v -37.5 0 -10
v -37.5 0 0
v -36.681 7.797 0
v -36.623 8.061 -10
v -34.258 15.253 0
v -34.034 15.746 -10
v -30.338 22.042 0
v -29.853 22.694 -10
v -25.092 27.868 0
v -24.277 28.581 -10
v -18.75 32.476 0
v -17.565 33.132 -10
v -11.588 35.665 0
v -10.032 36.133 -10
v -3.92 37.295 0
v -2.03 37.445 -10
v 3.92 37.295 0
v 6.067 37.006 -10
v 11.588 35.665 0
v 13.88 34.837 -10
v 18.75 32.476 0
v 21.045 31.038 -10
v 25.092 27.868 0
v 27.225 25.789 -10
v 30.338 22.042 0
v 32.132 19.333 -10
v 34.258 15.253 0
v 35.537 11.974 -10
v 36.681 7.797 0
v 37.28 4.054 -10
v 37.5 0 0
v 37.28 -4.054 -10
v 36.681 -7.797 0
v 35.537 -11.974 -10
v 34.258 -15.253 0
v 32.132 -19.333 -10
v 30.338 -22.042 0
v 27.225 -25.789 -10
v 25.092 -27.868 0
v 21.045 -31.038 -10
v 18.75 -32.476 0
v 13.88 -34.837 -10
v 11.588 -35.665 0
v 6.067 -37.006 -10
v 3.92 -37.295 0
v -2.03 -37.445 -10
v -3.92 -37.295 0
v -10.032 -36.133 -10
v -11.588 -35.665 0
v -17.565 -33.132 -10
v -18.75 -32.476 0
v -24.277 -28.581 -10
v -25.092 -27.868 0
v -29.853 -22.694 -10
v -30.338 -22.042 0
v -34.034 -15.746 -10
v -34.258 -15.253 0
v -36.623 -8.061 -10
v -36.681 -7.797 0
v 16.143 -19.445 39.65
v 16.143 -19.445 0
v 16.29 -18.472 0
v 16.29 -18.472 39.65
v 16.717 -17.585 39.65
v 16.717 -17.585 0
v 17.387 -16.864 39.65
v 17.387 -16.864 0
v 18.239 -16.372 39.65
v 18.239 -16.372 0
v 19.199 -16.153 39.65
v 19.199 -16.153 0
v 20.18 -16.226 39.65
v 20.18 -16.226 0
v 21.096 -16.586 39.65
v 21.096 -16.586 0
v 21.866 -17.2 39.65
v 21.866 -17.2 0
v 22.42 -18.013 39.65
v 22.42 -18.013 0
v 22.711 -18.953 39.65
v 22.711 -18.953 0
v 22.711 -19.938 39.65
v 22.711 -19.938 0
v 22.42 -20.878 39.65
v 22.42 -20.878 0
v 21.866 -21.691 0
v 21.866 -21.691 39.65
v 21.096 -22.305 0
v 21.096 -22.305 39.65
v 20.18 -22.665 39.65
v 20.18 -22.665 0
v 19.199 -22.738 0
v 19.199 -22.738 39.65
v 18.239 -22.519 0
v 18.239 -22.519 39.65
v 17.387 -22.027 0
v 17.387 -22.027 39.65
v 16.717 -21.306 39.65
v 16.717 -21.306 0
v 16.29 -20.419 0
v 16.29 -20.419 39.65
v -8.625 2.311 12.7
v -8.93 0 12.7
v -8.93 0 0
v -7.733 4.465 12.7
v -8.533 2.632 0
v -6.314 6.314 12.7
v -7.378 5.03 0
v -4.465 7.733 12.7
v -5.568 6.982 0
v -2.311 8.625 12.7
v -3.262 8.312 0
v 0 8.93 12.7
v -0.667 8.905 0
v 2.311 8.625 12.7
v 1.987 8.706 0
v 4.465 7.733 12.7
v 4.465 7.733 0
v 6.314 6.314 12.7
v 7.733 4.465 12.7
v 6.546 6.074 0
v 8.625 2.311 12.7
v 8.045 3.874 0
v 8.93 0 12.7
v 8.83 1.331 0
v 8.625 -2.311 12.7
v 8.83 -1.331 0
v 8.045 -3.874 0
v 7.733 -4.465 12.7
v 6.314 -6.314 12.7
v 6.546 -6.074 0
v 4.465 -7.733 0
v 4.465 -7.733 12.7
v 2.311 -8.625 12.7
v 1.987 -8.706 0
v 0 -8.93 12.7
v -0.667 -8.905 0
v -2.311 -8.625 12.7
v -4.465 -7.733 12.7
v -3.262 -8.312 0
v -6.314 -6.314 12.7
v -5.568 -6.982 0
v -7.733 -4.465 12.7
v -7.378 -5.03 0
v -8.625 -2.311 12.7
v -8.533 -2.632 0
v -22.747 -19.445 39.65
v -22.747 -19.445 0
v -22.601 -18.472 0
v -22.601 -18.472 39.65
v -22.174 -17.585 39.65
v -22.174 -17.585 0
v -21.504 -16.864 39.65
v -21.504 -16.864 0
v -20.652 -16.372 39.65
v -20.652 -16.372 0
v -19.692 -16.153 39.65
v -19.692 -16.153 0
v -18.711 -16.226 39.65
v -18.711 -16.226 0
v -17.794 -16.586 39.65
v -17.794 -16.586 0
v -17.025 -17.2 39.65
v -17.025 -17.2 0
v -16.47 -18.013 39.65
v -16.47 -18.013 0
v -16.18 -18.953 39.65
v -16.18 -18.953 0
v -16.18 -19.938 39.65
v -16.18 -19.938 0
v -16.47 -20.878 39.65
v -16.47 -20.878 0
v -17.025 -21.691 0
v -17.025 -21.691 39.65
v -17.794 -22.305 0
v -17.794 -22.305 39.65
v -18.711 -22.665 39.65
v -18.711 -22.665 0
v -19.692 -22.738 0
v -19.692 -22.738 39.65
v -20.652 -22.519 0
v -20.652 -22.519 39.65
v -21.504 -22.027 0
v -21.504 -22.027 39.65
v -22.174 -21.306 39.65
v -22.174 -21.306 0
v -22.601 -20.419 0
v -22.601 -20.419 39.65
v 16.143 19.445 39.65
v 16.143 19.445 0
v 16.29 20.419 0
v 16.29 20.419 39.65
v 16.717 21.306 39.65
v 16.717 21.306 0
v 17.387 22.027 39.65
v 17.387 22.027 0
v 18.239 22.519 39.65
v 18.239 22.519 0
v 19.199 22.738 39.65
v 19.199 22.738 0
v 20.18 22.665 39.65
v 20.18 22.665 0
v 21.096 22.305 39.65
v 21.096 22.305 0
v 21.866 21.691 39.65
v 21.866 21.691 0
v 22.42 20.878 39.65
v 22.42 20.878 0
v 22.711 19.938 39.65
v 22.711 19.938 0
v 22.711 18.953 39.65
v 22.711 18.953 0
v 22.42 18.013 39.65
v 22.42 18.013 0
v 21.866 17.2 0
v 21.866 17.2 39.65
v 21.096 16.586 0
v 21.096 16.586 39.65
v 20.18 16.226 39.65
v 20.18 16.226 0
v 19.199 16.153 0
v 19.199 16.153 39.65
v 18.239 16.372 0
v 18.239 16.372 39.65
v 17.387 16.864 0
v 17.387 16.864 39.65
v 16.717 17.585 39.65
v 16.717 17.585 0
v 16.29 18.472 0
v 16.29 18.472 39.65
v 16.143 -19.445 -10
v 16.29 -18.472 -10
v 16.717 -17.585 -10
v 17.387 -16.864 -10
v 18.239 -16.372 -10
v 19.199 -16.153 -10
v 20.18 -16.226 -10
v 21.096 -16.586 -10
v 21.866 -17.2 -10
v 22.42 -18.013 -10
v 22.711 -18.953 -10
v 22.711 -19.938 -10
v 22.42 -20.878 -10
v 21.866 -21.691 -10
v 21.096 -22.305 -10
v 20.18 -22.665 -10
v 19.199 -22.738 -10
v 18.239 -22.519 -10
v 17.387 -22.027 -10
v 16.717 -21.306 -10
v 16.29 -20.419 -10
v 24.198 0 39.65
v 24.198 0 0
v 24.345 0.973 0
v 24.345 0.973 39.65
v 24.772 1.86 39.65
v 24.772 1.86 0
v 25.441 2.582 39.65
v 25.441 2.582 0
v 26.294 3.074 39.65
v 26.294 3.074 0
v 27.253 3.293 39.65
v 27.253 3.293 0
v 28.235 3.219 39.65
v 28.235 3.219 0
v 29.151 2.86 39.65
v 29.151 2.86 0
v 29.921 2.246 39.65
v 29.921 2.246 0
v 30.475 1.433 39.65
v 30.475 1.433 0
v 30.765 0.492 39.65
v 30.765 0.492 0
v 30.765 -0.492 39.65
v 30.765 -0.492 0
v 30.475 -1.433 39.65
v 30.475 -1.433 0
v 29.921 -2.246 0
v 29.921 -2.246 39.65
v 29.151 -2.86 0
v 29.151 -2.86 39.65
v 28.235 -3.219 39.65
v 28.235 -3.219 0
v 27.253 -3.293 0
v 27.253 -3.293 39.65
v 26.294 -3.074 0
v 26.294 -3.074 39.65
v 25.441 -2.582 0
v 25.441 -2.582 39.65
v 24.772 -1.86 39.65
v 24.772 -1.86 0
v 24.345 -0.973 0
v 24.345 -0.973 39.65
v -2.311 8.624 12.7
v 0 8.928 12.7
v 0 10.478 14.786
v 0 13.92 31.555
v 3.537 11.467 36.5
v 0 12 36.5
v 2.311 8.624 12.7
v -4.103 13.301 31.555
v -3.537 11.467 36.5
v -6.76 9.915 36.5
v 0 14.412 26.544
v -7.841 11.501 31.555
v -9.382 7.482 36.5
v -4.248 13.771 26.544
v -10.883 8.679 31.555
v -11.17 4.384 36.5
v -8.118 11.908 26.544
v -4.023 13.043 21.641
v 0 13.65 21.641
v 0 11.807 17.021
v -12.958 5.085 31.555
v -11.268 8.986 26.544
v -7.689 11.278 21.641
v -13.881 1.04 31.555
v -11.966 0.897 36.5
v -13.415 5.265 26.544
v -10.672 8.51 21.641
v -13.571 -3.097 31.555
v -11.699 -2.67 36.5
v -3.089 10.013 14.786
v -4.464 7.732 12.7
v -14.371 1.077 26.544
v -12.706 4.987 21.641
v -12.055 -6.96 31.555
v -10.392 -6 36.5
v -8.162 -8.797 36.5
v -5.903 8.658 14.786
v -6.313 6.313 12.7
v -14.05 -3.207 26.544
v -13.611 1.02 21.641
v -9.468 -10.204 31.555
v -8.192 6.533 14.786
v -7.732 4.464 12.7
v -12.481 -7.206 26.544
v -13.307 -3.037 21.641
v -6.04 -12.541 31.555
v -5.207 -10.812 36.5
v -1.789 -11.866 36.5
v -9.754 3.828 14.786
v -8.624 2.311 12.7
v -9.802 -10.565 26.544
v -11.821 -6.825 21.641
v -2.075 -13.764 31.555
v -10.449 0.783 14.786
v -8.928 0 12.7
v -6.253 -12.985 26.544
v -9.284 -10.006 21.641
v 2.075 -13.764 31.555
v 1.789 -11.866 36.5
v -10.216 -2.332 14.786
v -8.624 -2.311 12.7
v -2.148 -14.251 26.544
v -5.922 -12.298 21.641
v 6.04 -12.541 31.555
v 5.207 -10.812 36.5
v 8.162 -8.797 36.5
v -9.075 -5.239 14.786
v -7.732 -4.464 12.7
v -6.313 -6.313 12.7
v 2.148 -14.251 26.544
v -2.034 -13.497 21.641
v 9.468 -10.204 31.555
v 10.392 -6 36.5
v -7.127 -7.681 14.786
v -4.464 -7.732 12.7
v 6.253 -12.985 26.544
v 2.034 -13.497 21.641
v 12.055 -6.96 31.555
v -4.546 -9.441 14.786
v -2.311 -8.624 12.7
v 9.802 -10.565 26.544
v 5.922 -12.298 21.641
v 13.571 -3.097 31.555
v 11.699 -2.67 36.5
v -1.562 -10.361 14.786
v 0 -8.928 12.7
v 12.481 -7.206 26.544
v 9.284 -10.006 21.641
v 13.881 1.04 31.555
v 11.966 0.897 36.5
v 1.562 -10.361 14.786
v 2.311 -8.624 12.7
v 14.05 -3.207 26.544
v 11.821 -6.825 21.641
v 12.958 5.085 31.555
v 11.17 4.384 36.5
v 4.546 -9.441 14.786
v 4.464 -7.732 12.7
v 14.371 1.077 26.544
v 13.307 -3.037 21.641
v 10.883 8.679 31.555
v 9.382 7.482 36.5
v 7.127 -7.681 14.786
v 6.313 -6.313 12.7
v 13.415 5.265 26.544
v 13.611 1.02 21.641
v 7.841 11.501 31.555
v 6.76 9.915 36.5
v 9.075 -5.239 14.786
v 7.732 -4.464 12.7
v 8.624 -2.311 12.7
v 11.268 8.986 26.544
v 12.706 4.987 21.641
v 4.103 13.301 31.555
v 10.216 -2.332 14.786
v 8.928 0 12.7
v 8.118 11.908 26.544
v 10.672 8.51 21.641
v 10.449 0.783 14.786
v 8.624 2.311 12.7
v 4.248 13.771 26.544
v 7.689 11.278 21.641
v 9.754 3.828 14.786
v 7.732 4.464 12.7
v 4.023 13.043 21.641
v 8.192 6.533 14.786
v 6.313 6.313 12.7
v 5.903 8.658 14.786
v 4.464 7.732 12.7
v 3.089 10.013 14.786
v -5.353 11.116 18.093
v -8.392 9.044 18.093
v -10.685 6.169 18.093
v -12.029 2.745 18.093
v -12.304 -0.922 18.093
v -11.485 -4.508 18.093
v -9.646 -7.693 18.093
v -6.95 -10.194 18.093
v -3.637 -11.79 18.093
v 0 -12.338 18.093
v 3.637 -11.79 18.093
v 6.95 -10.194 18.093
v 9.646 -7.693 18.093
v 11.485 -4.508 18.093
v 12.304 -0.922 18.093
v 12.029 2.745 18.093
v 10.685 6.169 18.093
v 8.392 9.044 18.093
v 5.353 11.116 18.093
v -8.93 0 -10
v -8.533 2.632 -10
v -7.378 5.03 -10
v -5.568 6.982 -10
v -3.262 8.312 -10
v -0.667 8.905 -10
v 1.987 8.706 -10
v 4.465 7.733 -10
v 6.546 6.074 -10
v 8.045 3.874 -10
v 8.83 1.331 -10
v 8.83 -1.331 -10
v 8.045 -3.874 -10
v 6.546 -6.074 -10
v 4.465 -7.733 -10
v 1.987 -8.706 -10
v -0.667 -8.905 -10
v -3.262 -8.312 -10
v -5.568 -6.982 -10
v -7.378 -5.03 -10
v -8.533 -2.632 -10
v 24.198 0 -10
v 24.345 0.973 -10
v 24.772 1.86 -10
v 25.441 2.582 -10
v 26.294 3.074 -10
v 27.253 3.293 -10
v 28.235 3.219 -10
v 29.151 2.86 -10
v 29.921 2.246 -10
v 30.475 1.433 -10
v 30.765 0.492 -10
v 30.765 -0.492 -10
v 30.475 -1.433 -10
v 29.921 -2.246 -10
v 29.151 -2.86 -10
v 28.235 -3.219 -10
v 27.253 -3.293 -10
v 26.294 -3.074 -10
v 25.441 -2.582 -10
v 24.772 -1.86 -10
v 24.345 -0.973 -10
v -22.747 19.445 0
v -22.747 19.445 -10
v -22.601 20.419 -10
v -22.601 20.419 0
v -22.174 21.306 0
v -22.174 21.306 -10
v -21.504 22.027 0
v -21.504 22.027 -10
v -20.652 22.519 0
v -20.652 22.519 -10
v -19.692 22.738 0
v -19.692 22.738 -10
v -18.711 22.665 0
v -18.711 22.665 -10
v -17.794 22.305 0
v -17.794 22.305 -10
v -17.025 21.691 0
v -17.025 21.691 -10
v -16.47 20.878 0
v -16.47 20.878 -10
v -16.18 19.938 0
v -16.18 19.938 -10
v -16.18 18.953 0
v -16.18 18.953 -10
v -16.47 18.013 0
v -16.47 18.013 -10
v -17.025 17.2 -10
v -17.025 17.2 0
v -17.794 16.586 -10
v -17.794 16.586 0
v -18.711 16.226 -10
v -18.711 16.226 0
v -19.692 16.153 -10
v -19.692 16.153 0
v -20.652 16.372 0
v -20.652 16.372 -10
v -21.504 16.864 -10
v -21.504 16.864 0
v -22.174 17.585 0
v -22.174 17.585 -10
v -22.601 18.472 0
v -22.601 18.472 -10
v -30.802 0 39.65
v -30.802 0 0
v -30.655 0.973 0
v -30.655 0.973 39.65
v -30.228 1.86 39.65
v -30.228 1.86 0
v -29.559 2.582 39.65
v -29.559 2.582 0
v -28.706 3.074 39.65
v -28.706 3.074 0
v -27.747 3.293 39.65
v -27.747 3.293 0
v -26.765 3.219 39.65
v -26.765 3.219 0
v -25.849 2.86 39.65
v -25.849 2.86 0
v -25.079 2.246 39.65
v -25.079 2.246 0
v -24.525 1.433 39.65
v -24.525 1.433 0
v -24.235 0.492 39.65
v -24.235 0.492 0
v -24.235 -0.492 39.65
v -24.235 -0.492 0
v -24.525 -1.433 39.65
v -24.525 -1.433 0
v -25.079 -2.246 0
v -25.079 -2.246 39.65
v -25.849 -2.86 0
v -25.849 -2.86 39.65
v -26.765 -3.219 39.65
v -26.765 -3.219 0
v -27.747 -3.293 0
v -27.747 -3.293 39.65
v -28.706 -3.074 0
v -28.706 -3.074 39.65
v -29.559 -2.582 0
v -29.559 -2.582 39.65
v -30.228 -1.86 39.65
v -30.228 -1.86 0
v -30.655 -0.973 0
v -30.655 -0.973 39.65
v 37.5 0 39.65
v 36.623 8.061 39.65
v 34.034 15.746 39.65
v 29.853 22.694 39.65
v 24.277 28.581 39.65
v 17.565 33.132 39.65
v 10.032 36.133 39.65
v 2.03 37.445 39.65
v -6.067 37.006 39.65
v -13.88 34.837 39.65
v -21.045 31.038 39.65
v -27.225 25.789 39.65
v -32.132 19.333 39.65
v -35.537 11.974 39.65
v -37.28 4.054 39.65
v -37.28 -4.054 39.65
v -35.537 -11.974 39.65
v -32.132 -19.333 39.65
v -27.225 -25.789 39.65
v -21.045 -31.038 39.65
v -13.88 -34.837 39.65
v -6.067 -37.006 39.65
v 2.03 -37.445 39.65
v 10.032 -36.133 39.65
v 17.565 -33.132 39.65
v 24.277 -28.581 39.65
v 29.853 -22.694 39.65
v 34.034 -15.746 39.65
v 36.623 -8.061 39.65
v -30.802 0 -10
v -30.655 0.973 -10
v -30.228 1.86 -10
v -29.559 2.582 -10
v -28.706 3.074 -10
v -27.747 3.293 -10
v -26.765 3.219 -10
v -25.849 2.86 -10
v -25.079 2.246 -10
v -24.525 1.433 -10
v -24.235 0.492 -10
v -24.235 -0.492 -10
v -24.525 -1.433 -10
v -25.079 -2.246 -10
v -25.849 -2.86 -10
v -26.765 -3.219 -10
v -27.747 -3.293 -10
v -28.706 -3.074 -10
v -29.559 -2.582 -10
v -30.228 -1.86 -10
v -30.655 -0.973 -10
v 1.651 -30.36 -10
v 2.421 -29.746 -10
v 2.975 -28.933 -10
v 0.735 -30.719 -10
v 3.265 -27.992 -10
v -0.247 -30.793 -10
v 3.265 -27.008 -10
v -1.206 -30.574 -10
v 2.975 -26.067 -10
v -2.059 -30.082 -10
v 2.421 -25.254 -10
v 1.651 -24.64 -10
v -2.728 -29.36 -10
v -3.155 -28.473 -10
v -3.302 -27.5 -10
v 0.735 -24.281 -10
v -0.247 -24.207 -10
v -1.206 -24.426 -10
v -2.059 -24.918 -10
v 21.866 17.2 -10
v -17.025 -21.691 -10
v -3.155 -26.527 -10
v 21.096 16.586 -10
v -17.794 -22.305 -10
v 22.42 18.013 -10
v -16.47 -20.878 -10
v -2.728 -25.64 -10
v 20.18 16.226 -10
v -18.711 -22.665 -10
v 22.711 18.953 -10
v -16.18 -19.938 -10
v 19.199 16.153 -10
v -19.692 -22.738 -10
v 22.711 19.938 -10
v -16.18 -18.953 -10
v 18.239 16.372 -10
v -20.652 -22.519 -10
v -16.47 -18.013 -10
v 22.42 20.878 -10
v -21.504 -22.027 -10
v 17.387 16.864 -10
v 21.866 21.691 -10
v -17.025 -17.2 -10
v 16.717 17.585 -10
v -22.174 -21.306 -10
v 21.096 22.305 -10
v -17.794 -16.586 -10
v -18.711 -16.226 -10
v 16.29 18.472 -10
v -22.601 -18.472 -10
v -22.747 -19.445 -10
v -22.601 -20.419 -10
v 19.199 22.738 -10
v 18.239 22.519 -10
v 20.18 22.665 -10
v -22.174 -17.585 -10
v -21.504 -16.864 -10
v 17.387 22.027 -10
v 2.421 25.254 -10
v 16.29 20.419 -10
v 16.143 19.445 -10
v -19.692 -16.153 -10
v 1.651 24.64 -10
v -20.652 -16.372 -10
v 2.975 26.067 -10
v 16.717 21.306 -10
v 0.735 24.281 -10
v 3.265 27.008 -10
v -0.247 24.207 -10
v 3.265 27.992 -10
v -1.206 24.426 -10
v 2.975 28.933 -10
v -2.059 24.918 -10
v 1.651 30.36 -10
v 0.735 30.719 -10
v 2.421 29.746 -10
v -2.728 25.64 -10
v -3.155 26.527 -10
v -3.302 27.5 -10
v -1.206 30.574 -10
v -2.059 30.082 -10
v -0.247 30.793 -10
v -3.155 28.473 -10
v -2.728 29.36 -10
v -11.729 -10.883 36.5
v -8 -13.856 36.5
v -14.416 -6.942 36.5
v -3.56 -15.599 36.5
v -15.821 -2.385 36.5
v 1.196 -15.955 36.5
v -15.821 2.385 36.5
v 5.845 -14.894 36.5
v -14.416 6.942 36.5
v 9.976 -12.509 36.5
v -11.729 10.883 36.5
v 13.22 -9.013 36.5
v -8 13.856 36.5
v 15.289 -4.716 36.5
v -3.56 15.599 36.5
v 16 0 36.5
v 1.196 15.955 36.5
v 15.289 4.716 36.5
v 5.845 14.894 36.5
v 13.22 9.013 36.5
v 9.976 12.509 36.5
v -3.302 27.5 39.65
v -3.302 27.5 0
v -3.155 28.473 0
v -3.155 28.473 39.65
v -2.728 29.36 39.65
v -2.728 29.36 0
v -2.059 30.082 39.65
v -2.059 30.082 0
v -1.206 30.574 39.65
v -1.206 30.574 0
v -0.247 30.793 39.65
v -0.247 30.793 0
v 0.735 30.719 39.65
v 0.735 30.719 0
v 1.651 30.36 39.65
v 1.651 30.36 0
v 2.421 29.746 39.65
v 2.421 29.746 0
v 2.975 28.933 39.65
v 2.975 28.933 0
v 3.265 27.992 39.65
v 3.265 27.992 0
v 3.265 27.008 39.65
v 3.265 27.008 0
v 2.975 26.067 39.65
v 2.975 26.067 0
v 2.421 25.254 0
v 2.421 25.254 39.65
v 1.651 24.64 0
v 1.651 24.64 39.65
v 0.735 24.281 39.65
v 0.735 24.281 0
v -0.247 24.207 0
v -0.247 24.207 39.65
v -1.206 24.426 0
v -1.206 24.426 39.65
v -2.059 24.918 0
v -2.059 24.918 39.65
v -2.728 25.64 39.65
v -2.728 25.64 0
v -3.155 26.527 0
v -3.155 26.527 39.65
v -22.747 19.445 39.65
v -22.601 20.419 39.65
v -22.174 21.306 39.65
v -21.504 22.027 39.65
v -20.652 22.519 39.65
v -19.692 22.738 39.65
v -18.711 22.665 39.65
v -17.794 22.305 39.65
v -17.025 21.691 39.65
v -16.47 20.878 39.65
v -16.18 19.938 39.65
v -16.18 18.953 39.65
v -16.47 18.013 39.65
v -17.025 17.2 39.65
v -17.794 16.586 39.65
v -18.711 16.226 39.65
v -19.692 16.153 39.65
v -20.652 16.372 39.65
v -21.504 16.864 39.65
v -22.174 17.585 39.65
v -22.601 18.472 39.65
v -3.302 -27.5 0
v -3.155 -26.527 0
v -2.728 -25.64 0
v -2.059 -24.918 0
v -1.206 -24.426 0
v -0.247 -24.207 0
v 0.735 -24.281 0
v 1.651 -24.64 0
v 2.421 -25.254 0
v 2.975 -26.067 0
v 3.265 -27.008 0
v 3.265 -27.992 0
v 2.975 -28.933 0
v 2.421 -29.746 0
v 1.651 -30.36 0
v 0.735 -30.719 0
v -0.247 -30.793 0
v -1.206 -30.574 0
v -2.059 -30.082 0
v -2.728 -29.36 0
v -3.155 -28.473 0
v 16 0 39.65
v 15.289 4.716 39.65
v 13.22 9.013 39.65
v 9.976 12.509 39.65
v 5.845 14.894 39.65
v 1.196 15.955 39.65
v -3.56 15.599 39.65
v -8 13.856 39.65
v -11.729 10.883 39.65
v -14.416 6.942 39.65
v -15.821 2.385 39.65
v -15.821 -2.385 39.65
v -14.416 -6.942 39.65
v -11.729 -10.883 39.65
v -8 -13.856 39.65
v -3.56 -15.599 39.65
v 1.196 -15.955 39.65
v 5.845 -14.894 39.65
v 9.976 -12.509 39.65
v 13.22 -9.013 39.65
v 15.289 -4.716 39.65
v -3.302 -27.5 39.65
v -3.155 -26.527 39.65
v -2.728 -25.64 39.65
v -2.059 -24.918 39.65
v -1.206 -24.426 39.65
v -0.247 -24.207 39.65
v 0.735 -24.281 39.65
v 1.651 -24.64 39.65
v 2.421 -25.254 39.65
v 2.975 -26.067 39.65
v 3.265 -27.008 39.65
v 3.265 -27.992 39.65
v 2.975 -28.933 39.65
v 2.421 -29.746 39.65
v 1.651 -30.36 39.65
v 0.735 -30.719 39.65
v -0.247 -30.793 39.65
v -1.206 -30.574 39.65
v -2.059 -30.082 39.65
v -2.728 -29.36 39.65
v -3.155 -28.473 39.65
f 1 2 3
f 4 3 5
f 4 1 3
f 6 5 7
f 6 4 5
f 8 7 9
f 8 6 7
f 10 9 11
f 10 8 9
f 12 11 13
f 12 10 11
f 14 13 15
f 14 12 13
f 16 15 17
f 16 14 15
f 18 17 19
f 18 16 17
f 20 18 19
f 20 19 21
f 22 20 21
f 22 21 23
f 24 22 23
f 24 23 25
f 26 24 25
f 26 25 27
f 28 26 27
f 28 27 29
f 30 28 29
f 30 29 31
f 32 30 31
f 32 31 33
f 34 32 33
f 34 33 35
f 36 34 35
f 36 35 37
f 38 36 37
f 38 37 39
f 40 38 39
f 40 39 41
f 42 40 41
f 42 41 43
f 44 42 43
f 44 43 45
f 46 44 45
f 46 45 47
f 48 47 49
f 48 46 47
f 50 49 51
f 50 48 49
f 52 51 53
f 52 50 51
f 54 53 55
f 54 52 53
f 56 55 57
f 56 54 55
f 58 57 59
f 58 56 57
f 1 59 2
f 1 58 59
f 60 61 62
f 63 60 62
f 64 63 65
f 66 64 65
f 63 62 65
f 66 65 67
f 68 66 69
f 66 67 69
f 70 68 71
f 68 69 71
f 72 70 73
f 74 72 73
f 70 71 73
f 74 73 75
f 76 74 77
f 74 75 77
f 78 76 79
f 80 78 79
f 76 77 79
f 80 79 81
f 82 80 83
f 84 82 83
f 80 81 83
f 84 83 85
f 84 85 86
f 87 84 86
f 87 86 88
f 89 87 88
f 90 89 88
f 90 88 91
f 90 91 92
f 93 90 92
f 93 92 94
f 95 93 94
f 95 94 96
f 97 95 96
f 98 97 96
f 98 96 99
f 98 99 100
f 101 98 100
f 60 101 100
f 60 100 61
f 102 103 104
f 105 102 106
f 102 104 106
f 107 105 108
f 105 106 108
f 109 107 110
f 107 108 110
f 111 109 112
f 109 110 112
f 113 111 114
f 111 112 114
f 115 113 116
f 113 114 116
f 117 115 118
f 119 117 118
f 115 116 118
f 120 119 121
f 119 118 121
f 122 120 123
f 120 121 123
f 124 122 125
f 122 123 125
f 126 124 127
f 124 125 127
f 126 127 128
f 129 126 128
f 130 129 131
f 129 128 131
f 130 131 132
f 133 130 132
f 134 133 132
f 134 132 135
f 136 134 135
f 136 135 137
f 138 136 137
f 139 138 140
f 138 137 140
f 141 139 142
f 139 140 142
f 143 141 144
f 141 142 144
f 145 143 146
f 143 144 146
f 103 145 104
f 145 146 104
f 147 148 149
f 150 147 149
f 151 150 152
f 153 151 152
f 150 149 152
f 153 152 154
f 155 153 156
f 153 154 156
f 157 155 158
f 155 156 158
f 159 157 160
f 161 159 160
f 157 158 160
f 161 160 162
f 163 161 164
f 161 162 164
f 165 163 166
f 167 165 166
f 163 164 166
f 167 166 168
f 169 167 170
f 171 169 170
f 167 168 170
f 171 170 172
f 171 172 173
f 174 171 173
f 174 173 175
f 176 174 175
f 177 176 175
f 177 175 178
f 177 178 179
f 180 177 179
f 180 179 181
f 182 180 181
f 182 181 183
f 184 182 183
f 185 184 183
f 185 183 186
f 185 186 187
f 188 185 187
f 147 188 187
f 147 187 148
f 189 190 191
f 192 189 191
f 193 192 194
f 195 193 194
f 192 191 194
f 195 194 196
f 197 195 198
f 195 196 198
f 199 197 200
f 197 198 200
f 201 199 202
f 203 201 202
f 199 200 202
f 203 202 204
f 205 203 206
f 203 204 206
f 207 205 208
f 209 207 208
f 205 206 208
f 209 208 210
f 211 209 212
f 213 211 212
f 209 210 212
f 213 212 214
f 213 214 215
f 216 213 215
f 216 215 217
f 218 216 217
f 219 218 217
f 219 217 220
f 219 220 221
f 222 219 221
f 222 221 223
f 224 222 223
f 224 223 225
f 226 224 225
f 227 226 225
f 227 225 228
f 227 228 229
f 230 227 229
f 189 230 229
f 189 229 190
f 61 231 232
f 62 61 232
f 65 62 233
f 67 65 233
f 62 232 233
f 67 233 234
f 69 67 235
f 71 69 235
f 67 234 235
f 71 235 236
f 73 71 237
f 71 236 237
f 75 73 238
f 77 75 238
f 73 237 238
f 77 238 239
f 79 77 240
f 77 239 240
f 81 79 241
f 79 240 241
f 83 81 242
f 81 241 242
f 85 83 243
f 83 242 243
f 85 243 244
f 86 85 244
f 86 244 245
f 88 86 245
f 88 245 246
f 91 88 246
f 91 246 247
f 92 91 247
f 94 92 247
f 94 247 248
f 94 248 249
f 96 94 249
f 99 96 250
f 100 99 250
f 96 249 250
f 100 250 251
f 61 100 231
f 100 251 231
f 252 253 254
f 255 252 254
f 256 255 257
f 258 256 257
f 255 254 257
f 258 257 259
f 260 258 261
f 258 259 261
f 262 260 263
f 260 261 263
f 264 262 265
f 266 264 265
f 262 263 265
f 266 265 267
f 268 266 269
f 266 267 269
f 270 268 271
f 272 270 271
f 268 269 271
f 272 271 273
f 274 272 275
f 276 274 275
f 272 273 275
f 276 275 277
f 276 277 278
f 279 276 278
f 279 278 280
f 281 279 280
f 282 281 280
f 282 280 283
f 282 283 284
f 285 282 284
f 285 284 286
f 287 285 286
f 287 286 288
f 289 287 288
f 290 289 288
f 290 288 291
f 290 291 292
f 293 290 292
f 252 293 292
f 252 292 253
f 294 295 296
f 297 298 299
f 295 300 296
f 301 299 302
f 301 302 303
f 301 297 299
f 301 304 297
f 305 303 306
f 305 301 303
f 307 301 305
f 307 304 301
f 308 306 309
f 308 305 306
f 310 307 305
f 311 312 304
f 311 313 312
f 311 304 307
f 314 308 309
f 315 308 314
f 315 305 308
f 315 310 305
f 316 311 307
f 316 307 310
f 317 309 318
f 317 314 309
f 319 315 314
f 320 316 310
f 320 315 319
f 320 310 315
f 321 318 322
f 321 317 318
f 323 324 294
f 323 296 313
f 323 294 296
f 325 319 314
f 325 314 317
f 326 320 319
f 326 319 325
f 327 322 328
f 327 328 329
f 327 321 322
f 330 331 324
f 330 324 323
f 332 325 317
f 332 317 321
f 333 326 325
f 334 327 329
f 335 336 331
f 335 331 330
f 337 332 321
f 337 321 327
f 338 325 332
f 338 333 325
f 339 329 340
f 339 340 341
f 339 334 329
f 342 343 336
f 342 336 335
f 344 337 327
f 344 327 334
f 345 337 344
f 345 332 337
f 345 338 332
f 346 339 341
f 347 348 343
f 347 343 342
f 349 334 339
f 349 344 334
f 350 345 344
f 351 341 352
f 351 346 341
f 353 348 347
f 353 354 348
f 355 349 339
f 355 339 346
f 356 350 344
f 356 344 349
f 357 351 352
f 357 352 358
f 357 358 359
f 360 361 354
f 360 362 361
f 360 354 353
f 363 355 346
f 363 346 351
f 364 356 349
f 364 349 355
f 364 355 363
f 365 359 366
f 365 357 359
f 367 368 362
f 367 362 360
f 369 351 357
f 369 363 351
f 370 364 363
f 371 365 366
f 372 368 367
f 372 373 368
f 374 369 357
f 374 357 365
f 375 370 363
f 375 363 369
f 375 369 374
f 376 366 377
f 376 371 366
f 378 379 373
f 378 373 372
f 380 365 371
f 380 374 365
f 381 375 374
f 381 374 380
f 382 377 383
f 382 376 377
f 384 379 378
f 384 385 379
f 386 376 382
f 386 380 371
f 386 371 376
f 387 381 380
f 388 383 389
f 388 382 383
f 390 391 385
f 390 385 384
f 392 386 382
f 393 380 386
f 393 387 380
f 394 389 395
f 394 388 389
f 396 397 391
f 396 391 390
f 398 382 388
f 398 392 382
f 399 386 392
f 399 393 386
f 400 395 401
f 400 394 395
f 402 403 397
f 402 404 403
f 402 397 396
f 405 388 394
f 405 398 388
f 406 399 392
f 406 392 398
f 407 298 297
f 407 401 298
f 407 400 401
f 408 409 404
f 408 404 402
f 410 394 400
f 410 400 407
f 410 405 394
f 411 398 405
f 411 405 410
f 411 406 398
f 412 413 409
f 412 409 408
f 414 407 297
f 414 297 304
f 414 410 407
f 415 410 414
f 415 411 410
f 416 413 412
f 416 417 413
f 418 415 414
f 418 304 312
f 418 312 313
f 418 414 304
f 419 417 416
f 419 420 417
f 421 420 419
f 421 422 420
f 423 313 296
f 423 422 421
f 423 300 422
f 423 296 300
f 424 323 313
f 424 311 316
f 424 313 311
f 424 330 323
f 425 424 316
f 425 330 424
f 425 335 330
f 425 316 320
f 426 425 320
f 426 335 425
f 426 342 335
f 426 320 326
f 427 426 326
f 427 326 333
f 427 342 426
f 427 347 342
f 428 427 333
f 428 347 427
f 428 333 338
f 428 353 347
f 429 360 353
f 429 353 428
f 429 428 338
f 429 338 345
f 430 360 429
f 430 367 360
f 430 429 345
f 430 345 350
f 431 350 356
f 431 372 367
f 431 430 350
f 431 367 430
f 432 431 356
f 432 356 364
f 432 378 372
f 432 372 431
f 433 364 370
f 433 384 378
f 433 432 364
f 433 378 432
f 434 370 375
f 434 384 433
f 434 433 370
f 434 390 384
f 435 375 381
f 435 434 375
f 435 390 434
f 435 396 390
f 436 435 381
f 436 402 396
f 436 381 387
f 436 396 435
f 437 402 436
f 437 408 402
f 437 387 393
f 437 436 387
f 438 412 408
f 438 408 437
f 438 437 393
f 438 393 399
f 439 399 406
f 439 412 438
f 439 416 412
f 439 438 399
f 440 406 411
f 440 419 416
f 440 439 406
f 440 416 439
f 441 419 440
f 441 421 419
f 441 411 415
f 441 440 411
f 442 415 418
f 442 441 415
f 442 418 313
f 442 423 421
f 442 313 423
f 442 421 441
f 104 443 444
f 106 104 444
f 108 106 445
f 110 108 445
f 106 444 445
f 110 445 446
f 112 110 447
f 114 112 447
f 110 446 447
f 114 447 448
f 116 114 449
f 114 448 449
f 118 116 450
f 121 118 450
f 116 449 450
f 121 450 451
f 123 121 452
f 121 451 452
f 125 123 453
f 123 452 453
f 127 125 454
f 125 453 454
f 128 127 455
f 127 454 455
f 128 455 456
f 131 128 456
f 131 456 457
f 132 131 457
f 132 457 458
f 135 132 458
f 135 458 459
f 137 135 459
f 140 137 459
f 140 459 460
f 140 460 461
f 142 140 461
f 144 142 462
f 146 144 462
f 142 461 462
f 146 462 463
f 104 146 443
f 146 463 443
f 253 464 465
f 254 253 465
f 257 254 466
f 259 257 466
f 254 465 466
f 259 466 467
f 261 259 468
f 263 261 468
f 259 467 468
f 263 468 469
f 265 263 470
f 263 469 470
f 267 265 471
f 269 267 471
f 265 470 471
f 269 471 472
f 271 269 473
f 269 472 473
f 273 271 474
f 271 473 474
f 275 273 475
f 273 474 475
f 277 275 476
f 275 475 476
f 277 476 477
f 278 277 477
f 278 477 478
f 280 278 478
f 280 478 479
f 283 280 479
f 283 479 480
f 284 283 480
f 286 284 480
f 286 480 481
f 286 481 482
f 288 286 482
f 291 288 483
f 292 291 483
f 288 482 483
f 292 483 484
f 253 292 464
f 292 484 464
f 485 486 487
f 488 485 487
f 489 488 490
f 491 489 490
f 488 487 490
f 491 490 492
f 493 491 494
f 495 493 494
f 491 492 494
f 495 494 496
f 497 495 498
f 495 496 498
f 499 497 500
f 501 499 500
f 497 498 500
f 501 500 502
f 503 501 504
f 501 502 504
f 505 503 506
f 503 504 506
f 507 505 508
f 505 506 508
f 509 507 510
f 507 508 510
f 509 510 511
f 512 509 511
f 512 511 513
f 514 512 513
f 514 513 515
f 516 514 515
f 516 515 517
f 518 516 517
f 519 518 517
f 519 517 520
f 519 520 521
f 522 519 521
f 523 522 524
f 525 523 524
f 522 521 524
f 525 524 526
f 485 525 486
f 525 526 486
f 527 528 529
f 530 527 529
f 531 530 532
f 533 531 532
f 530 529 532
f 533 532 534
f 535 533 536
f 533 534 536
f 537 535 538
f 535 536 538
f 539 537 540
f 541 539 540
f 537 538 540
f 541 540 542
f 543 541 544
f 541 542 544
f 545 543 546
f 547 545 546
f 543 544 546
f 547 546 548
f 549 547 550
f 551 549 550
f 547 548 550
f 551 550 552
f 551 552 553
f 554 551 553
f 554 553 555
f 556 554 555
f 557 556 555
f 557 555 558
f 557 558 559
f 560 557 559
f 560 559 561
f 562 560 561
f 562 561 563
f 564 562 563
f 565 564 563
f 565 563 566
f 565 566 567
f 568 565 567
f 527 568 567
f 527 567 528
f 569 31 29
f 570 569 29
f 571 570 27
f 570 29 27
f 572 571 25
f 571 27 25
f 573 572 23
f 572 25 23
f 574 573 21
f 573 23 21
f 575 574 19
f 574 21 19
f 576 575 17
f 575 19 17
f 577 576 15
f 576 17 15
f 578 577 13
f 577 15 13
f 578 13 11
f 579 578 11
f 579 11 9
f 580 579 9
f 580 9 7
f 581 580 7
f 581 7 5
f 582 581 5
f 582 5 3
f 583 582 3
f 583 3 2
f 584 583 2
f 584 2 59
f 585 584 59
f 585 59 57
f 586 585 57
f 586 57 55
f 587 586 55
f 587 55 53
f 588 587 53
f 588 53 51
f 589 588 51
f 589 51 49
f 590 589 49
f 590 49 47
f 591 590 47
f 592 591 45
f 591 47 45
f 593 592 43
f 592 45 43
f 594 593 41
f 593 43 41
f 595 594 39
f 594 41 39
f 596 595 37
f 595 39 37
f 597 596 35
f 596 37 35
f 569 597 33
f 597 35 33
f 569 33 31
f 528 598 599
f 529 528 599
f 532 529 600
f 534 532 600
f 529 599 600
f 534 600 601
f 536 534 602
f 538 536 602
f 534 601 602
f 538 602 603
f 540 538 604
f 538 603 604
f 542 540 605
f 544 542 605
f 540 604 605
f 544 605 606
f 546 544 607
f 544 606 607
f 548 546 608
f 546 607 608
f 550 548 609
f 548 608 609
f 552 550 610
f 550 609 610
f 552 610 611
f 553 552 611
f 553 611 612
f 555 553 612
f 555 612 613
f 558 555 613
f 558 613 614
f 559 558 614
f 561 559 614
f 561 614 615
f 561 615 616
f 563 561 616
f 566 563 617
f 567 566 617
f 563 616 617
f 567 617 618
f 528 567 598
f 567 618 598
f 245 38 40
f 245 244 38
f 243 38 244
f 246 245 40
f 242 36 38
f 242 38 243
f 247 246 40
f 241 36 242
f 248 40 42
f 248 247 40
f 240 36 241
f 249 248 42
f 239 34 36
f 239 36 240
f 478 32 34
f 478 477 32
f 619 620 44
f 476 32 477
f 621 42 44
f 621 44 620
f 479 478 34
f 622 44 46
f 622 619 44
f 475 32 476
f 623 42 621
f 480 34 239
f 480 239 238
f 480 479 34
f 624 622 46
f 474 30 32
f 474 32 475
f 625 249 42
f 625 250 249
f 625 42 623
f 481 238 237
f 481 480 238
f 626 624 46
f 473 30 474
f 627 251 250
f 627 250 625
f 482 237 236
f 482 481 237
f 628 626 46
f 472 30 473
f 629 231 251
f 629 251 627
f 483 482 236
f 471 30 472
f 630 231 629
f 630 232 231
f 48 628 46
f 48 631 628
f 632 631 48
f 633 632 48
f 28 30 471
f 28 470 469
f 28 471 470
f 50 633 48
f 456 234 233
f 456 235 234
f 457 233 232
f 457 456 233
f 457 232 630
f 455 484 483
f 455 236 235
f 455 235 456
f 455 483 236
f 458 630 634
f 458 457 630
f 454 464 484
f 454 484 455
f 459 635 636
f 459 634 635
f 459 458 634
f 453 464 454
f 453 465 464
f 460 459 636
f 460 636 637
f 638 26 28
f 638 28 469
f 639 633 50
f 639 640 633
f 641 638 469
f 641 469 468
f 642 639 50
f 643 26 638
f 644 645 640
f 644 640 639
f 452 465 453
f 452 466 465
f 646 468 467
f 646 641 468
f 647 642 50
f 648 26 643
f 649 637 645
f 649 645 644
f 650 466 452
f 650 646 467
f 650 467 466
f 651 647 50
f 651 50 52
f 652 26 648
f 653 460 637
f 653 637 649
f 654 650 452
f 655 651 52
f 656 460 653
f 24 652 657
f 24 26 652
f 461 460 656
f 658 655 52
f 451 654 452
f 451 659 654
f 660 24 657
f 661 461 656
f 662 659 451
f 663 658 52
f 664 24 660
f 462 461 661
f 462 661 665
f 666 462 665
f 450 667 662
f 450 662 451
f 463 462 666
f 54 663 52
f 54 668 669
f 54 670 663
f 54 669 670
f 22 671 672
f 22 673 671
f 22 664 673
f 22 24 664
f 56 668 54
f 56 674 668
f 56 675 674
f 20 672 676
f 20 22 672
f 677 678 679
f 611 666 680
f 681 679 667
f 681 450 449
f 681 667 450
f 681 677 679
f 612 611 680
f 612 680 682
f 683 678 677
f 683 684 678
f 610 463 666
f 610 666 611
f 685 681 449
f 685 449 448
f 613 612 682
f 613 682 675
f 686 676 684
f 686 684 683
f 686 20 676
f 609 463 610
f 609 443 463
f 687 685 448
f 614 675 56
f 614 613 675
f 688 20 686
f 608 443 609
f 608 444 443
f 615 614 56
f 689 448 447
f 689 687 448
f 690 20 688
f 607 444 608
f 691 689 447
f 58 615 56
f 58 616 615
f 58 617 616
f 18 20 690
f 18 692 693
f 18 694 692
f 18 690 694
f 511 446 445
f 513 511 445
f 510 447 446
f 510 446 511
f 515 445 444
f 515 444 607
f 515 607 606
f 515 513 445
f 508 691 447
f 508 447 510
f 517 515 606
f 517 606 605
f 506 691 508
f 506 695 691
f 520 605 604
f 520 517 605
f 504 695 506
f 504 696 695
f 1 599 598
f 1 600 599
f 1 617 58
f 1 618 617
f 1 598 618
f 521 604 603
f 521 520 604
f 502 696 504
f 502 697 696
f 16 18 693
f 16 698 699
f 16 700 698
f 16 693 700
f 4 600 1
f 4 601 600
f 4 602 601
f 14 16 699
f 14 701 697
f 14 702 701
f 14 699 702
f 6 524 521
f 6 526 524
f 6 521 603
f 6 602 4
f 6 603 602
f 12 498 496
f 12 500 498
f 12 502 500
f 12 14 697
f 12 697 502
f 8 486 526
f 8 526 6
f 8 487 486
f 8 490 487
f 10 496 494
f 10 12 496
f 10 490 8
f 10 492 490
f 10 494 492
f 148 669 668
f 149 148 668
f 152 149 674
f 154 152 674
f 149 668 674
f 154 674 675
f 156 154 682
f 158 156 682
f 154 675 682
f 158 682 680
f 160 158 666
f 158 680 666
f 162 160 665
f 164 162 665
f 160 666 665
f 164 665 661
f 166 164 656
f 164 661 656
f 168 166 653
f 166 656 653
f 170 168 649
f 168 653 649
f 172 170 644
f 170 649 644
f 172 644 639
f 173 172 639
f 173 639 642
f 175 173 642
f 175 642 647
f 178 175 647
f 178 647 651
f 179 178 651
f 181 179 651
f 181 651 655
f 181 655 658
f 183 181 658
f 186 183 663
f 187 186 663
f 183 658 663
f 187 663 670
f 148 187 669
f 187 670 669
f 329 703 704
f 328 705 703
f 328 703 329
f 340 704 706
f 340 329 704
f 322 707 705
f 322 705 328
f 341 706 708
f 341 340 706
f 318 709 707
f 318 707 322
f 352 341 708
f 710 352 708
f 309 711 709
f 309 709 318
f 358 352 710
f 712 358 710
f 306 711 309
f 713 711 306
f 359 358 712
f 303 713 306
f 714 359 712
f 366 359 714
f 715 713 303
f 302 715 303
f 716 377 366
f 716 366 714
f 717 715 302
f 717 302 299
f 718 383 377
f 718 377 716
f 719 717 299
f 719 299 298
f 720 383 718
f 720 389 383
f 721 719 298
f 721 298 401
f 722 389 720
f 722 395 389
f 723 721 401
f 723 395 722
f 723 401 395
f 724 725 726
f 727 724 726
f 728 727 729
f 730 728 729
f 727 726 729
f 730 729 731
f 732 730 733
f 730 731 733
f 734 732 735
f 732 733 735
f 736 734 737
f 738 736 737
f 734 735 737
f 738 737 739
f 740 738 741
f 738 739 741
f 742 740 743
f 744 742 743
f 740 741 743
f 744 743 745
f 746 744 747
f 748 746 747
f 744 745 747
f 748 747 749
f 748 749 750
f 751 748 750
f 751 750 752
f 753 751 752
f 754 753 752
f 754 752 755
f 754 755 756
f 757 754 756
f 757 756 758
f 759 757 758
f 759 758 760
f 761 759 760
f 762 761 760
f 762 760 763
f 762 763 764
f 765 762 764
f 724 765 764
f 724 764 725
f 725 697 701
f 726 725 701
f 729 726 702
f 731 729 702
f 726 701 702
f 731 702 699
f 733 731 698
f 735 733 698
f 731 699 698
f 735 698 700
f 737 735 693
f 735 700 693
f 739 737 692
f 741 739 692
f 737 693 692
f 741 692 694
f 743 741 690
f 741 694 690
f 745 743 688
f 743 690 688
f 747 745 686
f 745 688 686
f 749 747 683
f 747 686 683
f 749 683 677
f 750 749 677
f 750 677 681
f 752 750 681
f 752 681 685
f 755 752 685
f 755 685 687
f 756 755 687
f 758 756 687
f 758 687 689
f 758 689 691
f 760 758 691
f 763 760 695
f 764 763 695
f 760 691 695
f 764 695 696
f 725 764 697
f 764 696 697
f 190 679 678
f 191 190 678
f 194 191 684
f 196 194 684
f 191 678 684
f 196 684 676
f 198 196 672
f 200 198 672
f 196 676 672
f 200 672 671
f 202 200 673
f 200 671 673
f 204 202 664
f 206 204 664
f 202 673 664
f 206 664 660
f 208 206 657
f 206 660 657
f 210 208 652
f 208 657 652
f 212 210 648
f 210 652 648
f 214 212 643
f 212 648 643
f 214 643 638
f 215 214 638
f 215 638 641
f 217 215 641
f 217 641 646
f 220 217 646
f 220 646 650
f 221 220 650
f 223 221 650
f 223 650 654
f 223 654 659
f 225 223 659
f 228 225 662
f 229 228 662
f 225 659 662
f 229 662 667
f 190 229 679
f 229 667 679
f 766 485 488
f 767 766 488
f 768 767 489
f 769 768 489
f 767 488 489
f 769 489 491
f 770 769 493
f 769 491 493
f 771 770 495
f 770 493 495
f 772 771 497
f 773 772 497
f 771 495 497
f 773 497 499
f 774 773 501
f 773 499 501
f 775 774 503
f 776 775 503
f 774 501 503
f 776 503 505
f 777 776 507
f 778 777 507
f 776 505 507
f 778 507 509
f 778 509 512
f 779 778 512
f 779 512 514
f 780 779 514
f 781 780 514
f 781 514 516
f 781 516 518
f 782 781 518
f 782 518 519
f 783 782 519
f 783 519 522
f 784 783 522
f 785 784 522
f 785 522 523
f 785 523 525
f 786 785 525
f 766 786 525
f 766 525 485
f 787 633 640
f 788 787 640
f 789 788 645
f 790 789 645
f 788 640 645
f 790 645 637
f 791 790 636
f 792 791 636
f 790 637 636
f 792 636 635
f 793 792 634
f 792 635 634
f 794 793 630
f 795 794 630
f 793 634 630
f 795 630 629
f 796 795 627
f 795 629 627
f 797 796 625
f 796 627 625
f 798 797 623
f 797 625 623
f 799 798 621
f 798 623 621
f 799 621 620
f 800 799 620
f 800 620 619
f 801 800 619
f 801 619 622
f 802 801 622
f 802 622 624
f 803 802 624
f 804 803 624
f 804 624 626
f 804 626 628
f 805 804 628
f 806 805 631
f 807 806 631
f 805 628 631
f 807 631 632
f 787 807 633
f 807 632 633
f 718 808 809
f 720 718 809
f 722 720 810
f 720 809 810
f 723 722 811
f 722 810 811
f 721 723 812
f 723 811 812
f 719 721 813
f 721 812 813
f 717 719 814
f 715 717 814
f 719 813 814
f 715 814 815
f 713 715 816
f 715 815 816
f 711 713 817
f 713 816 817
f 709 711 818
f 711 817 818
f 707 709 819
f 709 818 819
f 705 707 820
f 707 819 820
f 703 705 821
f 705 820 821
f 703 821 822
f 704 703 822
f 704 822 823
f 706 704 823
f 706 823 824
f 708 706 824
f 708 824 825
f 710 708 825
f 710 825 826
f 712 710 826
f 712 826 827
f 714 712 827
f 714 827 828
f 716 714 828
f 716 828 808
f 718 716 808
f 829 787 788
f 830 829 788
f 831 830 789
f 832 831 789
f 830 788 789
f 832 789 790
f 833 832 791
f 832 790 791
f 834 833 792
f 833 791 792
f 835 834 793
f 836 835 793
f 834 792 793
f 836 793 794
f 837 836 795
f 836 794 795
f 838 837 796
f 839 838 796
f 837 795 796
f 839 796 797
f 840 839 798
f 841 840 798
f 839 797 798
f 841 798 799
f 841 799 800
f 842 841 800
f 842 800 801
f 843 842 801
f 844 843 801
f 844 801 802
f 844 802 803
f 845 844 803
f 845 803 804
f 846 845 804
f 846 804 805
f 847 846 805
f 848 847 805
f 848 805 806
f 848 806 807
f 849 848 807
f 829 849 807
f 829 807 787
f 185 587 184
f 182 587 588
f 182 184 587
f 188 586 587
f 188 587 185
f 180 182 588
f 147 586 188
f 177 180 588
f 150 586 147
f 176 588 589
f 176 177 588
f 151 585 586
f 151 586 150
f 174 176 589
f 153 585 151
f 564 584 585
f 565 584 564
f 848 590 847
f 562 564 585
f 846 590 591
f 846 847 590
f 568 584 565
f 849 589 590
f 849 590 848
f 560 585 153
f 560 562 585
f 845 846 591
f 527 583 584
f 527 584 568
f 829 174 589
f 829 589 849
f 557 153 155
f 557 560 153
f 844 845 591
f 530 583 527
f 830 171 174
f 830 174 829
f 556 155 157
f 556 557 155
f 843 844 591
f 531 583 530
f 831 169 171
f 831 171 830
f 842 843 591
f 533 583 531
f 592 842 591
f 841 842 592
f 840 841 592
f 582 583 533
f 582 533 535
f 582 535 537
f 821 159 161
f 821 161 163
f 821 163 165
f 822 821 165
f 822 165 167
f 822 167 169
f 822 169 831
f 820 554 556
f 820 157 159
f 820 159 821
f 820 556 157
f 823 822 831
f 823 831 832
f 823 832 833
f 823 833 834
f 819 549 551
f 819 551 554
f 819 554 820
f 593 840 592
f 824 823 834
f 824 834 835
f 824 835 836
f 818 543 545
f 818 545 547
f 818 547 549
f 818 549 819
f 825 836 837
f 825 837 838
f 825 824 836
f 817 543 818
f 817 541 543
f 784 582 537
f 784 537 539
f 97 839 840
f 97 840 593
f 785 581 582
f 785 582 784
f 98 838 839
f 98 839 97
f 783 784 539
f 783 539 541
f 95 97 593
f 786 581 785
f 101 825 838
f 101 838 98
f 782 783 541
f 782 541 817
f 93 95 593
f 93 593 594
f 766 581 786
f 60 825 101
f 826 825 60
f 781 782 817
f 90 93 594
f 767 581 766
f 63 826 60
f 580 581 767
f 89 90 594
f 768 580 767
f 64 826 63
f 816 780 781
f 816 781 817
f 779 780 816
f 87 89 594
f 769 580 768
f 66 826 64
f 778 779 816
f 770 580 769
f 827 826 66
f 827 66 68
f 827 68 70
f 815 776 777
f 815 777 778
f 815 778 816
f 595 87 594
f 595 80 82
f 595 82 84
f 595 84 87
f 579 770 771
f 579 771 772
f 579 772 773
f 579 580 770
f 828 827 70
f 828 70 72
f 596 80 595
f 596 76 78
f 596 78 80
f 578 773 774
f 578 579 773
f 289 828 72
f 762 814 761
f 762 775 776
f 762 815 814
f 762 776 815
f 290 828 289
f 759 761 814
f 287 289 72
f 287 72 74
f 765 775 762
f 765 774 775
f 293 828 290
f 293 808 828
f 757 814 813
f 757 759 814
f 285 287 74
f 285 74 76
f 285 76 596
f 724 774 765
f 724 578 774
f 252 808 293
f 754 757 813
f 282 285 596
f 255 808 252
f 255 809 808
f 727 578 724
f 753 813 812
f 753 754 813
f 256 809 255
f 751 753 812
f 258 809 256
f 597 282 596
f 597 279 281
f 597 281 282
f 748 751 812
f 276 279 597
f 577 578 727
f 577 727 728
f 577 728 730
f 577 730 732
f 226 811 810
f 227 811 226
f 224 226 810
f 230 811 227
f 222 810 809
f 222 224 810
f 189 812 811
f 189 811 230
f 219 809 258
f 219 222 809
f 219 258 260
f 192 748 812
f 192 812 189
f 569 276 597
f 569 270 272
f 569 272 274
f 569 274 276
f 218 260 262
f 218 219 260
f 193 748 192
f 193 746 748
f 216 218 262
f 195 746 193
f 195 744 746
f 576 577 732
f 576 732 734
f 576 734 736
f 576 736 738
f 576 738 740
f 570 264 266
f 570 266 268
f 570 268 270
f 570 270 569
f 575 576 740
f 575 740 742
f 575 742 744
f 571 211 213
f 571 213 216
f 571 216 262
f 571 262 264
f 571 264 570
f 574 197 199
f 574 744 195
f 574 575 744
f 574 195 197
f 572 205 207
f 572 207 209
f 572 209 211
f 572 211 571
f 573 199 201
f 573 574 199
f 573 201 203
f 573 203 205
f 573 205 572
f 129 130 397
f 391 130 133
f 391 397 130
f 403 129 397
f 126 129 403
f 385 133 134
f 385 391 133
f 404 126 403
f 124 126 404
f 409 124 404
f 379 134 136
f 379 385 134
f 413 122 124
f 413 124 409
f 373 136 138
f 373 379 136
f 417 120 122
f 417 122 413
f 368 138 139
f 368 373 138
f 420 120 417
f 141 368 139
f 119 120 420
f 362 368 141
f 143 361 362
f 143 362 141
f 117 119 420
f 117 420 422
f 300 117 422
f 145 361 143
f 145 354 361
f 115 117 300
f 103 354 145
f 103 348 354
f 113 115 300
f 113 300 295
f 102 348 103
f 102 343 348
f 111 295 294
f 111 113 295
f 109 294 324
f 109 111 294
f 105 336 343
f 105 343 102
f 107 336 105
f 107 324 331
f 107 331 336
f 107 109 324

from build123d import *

# Parameters (mm, degrees)
SKETCH1_R           = 37.5
BOSS_EXTRUDE1_DEPTH = 55
SKETCH2_R           = 16
CUT_EXTRUDE1_DEPTH  = 16
SKETCH3_R           = 16
CUT_EXTRUDE2_DEPTH  = 2.5
SKETCH6_R           = 8.9296875
CUT_EXTRUDE3_DEPTH  = 12.7
CUT_EXTRUDE4_START  = -15.35
SKETCH7_R           = 37.5
CUT_EXTRUDE4_DEPTH  = 15.35
SKETCH9_R           = 3.302
CUT_EXTRUDE6_DEPTH  = 67.216482087
BOSS_EXTRUDE2_START = 10
SKETCH10_R          = 37.5
SKETCH10_R_2        = 8.9296875
SKETCH10_R_3        = 3.302
BOSS_EXTRUDE2_DEPTH = 10


with BuildPart() as part:
    # Sketch1 → Boss-Extrude1 (new body)
    with BuildSketch(Plane.XY):
        Circle(SKETCH1_R)
    extrude(amount=BOSS_EXTRUDE1_DEPTH)

    # Sketch2 → Cut-Extrude1 (cut)
    with BuildSketch(Plane.XY.offset(55)):
        Circle(SKETCH2_R)
    extrude(amount=-CUT_EXTRUDE1_DEPTH, mode=Mode.SUBTRACT)

    # Sketch3 → Cut-Extrude2 (cut)
    with BuildSketch(Plane.XY.offset(39)):
        Circle(SKETCH3_R)
    extrude(amount=-CUT_EXTRUDE2_DEPTH, mode=Mode.SUBTRACT)

    # Sketch4 → Cut-Revolve1 (revolve, cut)
    with BuildSketch(Plane(origin=(0, 0, 0), x_dir=(0, 0, -1), z_dir=(1, 0, 0))):
        with BuildLine():
            Line((-12.7, 8.9281), (-12.7, 0))
            Line((-12.7, 0), (-36.5, 0))
            Line((-36.5, 0), (-36.5, 12))
            add(Edge.make_bspline(
                [(-36.5, 12), (-28.343745376, 16.523417527), (-19.165864626, 14.261468976), (-12.7, 8.9281)],
                knots=[0, 0, 0, 0, 1, 1, 1, 1], degree=3))
        make_face()
    revolve(axis=Axis((0, 0, 12.7), (0, 0, 1)), mode=Mode.SUBTRACT)

    # Sketch6 → Cut-Extrude3 (cut)
    with BuildSketch(Plane(origin=(0, 0, 0), x_dir=(-1, 0, 0), z_dir=(0, 0, -1))):
        Circle(SKETCH6_R)
    extrude(amount=-CUT_EXTRUDE3_DEPTH, mode=Mode.SUBTRACT)

    # Sketch7 → Cut-Extrude4 (cut)
    with BuildSketch(Plane.XY.offset(55).offset(CUT_EXTRUDE4_START)):
        Circle(SKETCH7_R)
    extrude(amount=CUT_EXTRUDE4_DEPTH, mode=Mode.SUBTRACT)

    # Sketch9 → Cut-Extrude6 (cut, through all)
    with BuildSketch(Plane(origin=(0, 0, 0), x_dir=(-1, 0, 0), z_dir=(0, 0, -1))):
        with Locations((0, -27.5)):
            Circle(SKETCH9_R)
        with Locations((-19.445436483, -19.445436483)):
            Circle(SKETCH9_R)
        with Locations((-27.5, 0)):
            Circle(SKETCH9_R)
        with Locations((-19.445436483, 19.445436483)):
            Circle(SKETCH9_R)
        with Locations((0, 27.5)):
            Circle(SKETCH9_R)
        with Locations((19.445436483, 19.445436483)):
            Circle(SKETCH9_R)
        with Locations((27.5, 0)):
            Circle(SKETCH9_R)
        with Locations((19.445436483, -19.445436483)):
            Circle(SKETCH9_R)
    extrude(amount=-CUT_EXTRUDE6_DEPTH, mode=Mode.SUBTRACT)

    # Sketch10 → Boss-Extrude2 (add)
    with BuildSketch(Plane(origin=(0, 0, 0), x_dir=(-1, 0, 0), z_dir=(0, 0, -1)).offset(BOSS_EXTRUDE2_START)):
        Circle(SKETCH10_R)
        Circle(SKETCH10_R_2, mode=Mode.SUBTRACT)
        with Locations((-27.5, 0)):
            Circle(SKETCH10_R_3, mode=Mode.SUBTRACT)
        with Locations((-19.445436483, -19.445436483)):
            Circle(SKETCH10_R_3, mode=Mode.SUBTRACT)
        with Locations((0, -27.5)):
            Circle(SKETCH10_R_3, mode=Mode.SUBTRACT)
        with Locations((19.445436483, -19.445436483)):
            Circle(SKETCH10_R_3, mode=Mode.SUBTRACT)
        with Locations((27.5, 0)):
            Circle(SKETCH10_R_3, mode=Mode.SUBTRACT)
        with Locations((19.445436483, 19.445436483)):
            Circle(SKETCH10_R_3, mode=Mode.SUBTRACT)
        with Locations((0, 27.5)):
            Circle(SKETCH10_R_3, mode=Mode.SUBTRACT)
        with Locations((-19.445436483, 19.445436483)):
            Circle(SKETCH10_R_3, mode=Mode.SUBTRACT)
    extrude(amount=-BOSS_EXTRUDE2_DEPTH)


solid = part.part
